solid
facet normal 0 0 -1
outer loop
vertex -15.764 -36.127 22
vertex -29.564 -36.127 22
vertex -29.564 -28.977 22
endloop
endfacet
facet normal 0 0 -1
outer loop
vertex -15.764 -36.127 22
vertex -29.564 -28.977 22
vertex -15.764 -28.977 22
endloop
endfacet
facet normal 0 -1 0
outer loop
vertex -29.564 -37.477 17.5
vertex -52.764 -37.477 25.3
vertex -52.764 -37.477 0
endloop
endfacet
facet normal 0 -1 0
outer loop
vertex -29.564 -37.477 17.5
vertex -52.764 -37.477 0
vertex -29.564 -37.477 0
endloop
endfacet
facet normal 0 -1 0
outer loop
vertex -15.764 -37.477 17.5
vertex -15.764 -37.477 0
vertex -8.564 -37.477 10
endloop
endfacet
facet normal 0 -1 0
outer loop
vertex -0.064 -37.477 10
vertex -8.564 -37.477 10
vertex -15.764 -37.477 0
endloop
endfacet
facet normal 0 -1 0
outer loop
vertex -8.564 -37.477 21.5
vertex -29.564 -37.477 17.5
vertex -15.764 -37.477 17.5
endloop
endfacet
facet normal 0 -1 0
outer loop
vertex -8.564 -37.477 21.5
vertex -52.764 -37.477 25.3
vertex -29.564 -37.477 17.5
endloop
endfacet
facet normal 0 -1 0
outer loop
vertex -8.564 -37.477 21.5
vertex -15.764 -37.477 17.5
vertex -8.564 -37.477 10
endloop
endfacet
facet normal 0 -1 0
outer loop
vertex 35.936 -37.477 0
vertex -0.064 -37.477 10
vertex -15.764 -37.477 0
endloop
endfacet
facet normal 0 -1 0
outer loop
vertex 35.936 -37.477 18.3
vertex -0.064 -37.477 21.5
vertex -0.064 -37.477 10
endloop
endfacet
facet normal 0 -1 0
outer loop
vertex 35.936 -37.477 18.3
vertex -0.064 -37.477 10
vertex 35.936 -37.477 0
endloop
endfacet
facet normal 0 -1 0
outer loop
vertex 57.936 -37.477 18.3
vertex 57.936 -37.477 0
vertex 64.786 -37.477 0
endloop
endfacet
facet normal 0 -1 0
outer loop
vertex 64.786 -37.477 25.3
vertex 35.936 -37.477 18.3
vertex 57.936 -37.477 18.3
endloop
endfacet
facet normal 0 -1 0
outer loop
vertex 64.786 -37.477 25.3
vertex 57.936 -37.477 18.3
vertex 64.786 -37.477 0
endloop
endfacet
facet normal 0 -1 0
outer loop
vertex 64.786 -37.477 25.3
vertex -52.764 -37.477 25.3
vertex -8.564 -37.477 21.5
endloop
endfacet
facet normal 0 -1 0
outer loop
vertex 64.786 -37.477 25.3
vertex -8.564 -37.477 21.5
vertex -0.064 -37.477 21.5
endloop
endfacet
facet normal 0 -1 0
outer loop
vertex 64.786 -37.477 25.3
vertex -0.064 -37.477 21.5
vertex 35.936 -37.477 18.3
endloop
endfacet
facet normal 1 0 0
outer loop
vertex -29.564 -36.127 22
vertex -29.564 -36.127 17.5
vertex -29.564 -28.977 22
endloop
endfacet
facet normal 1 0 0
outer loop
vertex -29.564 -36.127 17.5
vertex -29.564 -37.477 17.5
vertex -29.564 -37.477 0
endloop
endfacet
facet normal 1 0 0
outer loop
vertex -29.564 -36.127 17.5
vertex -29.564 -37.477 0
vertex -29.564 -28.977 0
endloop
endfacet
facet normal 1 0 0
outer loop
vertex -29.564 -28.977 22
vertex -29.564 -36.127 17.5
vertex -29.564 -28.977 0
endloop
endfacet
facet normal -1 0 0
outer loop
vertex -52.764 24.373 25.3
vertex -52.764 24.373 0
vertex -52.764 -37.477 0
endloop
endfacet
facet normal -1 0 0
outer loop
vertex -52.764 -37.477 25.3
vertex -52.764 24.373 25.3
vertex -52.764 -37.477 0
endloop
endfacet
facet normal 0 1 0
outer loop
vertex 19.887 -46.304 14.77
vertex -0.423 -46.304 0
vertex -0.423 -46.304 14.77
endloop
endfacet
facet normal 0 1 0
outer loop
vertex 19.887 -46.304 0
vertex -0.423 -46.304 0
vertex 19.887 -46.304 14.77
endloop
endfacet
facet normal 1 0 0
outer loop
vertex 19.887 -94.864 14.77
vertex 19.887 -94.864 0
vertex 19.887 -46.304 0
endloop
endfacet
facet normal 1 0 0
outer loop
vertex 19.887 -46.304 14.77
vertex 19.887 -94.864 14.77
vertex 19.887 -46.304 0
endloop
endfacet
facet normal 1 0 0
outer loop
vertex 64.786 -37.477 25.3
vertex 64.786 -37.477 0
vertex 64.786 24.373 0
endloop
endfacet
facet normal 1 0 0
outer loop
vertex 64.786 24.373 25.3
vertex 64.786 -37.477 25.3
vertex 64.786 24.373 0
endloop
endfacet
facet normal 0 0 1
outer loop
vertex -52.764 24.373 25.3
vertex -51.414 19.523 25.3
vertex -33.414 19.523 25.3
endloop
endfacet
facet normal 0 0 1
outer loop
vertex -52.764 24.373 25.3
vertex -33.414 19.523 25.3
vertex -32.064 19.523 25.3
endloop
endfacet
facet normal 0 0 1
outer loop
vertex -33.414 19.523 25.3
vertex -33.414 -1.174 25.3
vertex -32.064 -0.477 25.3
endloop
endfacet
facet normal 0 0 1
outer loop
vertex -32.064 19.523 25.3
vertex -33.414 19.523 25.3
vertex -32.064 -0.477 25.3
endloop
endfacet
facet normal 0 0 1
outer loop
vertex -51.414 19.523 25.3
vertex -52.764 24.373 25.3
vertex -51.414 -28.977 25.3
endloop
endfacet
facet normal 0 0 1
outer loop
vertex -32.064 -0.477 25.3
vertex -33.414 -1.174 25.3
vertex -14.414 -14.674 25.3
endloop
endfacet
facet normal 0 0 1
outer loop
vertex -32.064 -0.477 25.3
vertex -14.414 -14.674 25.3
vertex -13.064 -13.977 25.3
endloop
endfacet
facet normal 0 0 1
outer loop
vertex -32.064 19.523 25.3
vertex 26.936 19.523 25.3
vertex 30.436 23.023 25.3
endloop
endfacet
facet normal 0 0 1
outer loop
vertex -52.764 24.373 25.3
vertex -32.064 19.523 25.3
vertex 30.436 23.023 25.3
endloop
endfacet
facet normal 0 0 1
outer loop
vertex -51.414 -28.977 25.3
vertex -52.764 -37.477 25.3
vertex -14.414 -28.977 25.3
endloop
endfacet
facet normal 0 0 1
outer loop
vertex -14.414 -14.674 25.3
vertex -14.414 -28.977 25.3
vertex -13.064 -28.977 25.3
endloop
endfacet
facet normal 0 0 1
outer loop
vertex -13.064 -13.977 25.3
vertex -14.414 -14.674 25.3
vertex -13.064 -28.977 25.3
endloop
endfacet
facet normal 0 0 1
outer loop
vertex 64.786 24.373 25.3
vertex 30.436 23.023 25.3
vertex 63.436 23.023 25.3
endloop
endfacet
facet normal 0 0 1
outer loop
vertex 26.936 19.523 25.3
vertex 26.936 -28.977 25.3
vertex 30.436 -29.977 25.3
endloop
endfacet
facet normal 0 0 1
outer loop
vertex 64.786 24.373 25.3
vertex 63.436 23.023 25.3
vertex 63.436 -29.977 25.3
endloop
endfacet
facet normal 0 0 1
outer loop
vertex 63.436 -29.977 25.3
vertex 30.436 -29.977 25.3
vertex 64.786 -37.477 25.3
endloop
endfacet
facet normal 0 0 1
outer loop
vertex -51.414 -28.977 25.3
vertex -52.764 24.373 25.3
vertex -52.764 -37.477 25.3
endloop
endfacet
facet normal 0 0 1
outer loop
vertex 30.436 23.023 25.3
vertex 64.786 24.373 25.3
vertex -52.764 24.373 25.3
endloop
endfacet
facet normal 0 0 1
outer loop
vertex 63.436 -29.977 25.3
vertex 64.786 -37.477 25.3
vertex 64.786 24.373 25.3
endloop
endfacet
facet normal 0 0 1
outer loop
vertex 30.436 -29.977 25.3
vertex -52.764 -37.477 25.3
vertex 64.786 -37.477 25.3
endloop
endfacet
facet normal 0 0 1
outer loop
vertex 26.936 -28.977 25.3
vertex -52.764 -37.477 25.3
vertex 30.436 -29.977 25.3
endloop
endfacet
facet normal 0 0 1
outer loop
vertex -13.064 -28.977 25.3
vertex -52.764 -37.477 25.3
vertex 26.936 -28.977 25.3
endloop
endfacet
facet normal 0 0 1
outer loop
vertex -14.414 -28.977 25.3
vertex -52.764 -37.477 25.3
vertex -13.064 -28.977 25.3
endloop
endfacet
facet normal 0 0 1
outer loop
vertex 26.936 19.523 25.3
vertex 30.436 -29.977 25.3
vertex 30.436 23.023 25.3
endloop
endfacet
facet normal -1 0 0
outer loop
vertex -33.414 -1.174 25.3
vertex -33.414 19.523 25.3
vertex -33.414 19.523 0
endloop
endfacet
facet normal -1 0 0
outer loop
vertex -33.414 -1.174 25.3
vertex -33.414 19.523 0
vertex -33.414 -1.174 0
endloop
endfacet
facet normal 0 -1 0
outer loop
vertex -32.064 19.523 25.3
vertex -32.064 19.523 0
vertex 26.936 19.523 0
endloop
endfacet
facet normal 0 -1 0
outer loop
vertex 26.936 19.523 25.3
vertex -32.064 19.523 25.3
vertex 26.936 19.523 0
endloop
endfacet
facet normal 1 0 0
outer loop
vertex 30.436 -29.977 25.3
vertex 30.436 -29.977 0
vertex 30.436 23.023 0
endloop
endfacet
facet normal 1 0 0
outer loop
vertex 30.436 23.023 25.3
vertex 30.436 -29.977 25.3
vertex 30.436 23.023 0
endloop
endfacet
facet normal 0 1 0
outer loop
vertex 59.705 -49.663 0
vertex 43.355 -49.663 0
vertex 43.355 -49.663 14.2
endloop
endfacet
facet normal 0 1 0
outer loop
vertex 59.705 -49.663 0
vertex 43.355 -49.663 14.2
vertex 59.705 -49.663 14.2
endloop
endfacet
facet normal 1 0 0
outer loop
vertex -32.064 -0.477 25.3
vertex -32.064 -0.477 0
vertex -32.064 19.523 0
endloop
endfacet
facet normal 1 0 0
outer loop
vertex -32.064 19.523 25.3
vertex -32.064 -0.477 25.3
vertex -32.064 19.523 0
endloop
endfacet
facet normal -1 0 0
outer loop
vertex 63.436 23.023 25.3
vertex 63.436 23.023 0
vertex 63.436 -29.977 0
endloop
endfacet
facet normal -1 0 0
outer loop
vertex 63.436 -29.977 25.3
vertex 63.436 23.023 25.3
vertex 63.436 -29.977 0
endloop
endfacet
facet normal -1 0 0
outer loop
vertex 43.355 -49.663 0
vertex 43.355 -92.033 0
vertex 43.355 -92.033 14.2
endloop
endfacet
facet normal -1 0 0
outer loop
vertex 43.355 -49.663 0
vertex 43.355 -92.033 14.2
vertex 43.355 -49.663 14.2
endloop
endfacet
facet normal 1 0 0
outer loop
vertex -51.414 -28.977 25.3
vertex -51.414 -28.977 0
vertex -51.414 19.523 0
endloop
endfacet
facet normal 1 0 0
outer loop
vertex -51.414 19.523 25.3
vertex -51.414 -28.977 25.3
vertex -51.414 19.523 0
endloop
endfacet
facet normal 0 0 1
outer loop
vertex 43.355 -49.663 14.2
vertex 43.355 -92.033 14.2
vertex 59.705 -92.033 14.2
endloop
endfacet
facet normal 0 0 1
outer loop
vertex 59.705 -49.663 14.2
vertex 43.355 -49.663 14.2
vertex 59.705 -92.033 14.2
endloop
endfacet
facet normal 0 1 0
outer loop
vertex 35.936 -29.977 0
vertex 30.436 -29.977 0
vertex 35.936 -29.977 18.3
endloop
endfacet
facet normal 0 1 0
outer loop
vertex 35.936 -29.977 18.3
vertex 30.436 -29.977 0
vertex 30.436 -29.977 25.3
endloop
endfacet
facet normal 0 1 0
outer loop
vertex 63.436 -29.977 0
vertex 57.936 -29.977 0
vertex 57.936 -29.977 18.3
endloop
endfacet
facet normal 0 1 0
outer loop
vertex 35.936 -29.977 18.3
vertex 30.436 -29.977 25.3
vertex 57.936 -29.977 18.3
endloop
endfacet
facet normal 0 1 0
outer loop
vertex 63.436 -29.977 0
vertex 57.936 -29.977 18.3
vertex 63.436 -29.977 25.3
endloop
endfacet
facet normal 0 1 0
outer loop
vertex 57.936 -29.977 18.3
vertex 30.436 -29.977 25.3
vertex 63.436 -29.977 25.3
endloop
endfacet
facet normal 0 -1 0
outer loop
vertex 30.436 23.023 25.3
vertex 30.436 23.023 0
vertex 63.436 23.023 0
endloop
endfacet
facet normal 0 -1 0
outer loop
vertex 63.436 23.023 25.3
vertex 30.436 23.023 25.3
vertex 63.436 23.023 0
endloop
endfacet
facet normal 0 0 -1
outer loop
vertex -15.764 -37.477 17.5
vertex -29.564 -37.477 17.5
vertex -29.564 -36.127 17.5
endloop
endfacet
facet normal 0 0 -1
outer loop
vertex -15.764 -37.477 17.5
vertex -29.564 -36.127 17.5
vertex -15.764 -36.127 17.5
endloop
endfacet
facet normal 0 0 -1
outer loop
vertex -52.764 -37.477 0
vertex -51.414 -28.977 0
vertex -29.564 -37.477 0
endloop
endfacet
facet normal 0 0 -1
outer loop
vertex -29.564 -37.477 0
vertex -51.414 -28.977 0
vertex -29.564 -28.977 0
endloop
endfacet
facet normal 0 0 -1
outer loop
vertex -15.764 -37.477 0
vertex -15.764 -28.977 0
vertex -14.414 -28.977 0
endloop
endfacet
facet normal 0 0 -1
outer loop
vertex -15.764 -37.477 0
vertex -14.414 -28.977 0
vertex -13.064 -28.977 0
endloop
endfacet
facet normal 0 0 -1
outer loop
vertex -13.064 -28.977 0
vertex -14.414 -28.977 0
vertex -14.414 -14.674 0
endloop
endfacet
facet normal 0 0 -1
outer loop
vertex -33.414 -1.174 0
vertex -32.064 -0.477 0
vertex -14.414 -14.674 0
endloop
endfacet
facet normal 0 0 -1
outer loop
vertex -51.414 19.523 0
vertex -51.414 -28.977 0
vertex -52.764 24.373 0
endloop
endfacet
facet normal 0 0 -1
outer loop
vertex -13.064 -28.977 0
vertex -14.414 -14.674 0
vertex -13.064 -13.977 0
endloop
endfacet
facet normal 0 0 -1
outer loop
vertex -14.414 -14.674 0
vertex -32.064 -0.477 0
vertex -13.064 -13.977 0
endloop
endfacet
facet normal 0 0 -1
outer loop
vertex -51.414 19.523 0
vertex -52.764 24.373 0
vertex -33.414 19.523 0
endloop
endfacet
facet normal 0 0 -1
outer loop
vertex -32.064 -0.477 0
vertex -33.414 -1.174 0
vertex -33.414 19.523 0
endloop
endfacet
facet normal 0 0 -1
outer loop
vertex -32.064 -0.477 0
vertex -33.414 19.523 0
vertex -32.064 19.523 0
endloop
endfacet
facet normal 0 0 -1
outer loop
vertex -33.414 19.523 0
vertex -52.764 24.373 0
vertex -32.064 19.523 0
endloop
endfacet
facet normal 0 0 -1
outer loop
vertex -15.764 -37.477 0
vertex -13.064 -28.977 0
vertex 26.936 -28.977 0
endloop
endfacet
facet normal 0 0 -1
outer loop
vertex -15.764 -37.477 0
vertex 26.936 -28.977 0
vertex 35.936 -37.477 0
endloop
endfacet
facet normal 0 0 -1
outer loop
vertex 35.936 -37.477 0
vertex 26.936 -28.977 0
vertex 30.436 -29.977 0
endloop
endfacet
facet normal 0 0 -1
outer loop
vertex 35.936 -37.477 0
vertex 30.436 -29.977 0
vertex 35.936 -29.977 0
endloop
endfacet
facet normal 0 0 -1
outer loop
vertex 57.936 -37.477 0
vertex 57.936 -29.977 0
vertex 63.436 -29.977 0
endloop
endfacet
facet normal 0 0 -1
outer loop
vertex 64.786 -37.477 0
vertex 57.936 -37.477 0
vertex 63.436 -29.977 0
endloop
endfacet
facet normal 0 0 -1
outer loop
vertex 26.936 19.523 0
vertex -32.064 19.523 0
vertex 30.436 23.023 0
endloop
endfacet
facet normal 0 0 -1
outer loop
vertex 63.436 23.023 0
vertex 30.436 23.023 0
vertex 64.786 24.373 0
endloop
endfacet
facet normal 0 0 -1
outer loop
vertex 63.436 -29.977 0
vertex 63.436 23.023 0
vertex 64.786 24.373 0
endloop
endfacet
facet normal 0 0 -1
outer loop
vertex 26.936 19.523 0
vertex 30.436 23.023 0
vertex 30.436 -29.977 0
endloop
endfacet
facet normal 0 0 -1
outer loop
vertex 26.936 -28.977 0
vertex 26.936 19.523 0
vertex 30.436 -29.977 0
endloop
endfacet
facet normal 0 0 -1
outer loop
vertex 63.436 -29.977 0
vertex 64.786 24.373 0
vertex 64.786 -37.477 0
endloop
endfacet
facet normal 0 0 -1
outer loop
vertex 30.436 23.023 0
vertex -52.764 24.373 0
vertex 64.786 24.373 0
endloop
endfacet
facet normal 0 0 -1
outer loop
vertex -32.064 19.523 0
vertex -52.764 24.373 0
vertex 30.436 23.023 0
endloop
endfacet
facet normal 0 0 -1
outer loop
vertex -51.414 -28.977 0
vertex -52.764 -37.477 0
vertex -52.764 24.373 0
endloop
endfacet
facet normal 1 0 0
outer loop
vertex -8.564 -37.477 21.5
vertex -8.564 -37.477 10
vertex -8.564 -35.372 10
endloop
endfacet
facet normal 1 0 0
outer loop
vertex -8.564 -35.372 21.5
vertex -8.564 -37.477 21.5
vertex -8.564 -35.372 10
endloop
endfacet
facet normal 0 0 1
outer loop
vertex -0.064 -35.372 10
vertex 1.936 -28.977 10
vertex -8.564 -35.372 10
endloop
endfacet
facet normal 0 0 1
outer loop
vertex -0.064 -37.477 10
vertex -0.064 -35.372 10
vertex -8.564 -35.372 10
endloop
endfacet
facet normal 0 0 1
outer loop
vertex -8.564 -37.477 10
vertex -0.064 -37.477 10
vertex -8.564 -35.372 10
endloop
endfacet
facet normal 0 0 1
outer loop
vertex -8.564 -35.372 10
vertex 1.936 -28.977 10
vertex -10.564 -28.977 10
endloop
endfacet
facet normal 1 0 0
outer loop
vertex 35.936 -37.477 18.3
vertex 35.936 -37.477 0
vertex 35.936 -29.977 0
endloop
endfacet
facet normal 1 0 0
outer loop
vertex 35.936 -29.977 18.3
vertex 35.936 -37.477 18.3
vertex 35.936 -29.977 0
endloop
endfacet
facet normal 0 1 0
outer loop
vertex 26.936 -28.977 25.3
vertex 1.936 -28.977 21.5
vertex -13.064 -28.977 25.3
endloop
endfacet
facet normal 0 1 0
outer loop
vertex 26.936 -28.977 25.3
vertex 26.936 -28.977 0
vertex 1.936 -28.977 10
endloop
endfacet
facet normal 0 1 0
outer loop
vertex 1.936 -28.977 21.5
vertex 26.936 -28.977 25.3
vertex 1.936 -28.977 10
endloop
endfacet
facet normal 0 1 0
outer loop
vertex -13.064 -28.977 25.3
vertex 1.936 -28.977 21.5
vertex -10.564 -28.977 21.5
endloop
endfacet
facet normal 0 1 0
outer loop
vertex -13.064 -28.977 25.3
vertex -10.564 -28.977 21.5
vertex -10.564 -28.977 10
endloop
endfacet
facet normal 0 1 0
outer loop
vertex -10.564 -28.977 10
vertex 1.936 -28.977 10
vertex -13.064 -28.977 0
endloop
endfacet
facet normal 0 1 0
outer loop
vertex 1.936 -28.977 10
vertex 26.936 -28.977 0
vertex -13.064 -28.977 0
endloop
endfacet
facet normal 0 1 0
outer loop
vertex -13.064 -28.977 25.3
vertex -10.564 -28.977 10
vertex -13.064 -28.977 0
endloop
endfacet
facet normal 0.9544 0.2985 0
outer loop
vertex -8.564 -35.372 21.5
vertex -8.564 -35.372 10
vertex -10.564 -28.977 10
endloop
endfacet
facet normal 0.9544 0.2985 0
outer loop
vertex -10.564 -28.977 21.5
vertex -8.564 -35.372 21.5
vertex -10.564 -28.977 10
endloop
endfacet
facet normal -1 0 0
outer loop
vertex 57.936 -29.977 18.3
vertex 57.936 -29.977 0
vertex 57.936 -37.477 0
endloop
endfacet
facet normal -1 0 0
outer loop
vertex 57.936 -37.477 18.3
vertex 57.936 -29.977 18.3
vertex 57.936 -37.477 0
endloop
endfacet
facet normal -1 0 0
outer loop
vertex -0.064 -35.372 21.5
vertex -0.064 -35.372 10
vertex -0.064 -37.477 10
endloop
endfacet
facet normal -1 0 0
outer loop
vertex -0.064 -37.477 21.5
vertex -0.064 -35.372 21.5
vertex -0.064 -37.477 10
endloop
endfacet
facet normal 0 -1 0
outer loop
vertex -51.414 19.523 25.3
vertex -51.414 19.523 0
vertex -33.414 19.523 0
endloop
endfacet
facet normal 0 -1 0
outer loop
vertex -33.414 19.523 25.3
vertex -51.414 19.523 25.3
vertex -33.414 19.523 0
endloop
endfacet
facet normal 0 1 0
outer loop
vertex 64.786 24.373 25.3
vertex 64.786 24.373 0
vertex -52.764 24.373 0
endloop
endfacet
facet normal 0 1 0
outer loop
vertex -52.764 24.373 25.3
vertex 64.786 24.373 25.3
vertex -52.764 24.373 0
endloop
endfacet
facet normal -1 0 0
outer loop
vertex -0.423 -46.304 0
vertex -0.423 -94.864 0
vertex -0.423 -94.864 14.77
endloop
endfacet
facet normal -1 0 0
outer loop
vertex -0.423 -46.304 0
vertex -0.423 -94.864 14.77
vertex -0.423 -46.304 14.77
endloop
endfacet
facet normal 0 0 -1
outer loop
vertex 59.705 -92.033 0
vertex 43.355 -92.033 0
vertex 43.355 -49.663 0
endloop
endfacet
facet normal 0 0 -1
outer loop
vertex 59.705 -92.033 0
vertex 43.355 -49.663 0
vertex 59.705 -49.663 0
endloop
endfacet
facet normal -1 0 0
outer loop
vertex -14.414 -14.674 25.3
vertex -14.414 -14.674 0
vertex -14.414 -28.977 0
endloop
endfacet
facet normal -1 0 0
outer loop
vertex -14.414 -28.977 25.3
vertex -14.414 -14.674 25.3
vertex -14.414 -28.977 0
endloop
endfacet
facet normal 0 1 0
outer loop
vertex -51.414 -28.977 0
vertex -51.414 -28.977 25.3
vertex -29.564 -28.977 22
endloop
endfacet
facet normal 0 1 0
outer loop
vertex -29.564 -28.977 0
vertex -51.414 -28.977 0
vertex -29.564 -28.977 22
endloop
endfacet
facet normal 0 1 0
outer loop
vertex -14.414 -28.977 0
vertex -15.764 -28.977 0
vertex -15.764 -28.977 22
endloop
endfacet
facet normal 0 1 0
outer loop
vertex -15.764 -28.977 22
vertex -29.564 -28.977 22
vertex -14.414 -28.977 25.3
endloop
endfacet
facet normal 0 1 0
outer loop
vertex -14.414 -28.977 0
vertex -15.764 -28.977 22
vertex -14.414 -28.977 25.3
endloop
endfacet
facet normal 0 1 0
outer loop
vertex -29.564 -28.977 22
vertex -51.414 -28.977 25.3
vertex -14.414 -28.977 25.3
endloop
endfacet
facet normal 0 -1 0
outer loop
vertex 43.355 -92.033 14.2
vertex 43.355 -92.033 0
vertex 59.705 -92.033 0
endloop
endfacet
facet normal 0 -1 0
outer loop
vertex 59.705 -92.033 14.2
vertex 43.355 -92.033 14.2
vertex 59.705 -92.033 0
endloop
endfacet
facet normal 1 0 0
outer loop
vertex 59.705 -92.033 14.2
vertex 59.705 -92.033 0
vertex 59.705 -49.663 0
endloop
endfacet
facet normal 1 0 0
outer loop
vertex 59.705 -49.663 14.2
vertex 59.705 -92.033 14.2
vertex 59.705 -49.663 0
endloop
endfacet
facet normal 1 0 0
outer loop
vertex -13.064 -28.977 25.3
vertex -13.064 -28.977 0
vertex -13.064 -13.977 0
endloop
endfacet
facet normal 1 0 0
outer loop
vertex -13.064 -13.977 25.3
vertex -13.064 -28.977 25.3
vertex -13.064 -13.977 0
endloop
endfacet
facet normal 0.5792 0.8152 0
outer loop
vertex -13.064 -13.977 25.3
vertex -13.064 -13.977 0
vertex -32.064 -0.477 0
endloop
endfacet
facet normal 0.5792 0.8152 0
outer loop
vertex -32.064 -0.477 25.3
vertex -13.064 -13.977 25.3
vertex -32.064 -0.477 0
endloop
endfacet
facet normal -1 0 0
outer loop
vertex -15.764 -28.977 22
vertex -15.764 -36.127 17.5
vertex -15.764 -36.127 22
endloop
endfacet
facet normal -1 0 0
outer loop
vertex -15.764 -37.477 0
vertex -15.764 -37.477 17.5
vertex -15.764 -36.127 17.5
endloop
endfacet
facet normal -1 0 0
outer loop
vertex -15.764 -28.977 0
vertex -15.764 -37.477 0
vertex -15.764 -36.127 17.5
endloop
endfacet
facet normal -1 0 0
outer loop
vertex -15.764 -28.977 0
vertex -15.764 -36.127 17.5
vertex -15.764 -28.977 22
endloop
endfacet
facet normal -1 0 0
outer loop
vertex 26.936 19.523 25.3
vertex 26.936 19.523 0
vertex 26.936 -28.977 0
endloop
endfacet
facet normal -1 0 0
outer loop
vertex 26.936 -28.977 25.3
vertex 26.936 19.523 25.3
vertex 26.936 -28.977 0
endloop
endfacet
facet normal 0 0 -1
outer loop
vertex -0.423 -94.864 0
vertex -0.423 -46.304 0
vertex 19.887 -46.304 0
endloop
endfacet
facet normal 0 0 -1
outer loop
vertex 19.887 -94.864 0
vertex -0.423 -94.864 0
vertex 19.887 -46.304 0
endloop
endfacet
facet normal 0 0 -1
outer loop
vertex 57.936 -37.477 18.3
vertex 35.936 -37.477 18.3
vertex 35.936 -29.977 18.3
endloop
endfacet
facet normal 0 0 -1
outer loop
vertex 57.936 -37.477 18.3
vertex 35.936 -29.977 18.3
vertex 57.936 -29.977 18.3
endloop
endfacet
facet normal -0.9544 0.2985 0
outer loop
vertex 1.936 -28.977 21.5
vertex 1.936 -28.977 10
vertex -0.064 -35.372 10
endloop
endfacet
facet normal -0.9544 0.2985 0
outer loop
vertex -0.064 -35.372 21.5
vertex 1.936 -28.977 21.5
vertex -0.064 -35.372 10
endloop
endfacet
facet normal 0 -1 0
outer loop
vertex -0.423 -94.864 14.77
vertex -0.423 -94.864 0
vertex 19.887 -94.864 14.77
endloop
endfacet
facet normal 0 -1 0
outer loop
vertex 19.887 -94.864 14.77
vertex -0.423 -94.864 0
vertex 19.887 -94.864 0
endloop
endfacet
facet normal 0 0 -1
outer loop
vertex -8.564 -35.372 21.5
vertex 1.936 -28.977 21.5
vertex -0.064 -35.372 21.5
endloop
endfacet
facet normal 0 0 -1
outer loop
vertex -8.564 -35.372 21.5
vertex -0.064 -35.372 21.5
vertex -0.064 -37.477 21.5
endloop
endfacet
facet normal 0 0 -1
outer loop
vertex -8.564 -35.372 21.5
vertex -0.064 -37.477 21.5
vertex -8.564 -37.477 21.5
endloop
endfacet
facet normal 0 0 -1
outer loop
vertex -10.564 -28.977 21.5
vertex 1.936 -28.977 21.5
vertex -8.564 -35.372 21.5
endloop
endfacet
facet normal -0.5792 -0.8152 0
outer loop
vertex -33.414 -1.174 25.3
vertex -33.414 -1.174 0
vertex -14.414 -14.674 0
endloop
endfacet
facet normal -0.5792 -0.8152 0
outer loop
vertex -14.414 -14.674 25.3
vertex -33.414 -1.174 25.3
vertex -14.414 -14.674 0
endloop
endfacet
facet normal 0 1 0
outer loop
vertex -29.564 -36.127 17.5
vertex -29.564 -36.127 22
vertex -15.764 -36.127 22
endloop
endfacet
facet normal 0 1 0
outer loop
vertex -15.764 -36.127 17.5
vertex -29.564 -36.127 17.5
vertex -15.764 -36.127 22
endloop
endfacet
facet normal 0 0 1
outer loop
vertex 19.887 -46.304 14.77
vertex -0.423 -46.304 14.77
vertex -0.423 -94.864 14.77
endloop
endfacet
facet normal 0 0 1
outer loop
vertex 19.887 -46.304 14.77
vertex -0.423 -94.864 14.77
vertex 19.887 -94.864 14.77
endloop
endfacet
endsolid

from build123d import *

# Parameters (mm, degrees)
F0_W      = 1.35
F0_H      = 8.5
F1_DEPTH  = 25.3
F2_W      = 22
F2_H      = 7
F3_DEPTH  = 7.5
F4_W      = 12.5
F4_H      = 3.8
F4_H_2    = 10
F5_DEPTH  = 8.5
F6_W      = 13.8
F6_H      = 3.3
F7_DEPTH  = 8.5
F6_H_2    = 4.5
F8_DEPTH  = 1.35
F9_W      = 20.31
F9_H      = 48.56
F10_DEPTH = 14.77
F11_W     = 16.35
F11_H     = 42.37
F12_DEPTH = 14.2


with BuildPart() as f1:
    # F0 (on Top) → F1 (new body)
    with BuildSketch(Plane.XY):
        Polygon((30.4358748317, -29.9773273379), (30.4358748317, 23.0226726621), (63.4358748317, 23.0226726621), (63.4358748317, -29.9773273379), (57.9358748317, -29.9773273379), (57.9358748317, -37.4773273379), (64.7858748317, -37.4773273379), (64.7858748317, 24.3726726621), (-33.4141251683, 24.3726726621), (-52.7641251683, 24.3726726621), (-52.7641251683, -37.4773273379), (-29.5641251683, -37.4773273379), (-29.5641251683, -28.9773273379), (-51.4141251683, -28.9773273379), (-51.4141251683, 19.5226726621), (-33.4141251683, 19.5226726621), (-33.4141251683, -1.1741919408), (-14.4141251683, -14.6741919408), (-14.4141251683, -28.9773273379), (-14.4141251683, -37.4773273379), (-8.5641251683, -37.4773273379), (-8.5641251683, -35.3718562494), (-10.5641251683, -28.9773273379), (-13.0641251683, -28.9773273379), (-13.0641251683, -13.9773273379), (-32.0641251683, -0.4773273379), (-32.0641251683, 19.5226726621), (26.9358748317, 19.5226726621), (26.9358748317, -28.9773273379), (1.9358748317, -28.9773273379), (-0.0641251683, -35.3718562494), (-0.0641251683, -37.4773273379), (35.9358748317, -37.4773273379), (35.9358748317, -29.9773273379), align=None)
        with Locations((-15.0891251683, -33.2273273379)):
            Rectangle(F0_W, F0_H)
    extrude(amount=F1_DEPTH)

    # F2 (on face) → F3 (join, through all)
    with BuildSketch(Plane.XZ.offset(37.4773273379)):
        with Locations((46.9358748317, 21.8)):
            Rectangle(F2_W, F2_H)
    extrude(amount=-F3_DEPTH)

    # F4 (on face) → F5 (join, through all)
    with BuildSketch(Plane(origin=(0, -28.9773273379, 0), x_dir=(-1, 0, 0), z_dir=(0, 1, 0))):
        with Locations((4.3141251683, 23.4)):
            Rectangle(F4_W, F4_H)
        with Locations((4.3141251683, 5)):
            Rectangle(F4_W, F4_H_2)
    extrude(amount=-F5_DEPTH)

    # F6 (on face) → F7 (join, through all)
    with BuildSketch(Plane.XZ.offset(37.4773273379)):
        with Locations((-22.6641251683, 23.65)):
            Rectangle(F6_W, F6_H)
    extrude(amount=-F7_DEPTH)

    # F6 (on face) → F8 (join)
    with BuildSketch(Plane.XZ.offset(37.4773273379)):
        with Locations((-22.6641251683, 19.75)):
            Rectangle(F6_W, F6_H_2)
    extrude(amount=-F8_DEPTH)


with BuildPart() as f10:
    # F9 (on Top) → F10 (new body)
    with BuildSketch(Plane.XY):
        with Locations((9.7315327984, -70.5840182614)):
            Rectangle(F9_W, F9_H)
    extrude(amount=F10_DEPTH)


with BuildPart() as f12:
    # F11 (on Top) → F12 (new body)
    with BuildSketch(Plane.XY):
        with Locations((51.5299370281, -70.8480384201)):
            Rectangle(F11_W, F11_H)
    extrude(amount=F12_DEPTH)


solid = Compound([f1.part, f10.part, f12.part])
